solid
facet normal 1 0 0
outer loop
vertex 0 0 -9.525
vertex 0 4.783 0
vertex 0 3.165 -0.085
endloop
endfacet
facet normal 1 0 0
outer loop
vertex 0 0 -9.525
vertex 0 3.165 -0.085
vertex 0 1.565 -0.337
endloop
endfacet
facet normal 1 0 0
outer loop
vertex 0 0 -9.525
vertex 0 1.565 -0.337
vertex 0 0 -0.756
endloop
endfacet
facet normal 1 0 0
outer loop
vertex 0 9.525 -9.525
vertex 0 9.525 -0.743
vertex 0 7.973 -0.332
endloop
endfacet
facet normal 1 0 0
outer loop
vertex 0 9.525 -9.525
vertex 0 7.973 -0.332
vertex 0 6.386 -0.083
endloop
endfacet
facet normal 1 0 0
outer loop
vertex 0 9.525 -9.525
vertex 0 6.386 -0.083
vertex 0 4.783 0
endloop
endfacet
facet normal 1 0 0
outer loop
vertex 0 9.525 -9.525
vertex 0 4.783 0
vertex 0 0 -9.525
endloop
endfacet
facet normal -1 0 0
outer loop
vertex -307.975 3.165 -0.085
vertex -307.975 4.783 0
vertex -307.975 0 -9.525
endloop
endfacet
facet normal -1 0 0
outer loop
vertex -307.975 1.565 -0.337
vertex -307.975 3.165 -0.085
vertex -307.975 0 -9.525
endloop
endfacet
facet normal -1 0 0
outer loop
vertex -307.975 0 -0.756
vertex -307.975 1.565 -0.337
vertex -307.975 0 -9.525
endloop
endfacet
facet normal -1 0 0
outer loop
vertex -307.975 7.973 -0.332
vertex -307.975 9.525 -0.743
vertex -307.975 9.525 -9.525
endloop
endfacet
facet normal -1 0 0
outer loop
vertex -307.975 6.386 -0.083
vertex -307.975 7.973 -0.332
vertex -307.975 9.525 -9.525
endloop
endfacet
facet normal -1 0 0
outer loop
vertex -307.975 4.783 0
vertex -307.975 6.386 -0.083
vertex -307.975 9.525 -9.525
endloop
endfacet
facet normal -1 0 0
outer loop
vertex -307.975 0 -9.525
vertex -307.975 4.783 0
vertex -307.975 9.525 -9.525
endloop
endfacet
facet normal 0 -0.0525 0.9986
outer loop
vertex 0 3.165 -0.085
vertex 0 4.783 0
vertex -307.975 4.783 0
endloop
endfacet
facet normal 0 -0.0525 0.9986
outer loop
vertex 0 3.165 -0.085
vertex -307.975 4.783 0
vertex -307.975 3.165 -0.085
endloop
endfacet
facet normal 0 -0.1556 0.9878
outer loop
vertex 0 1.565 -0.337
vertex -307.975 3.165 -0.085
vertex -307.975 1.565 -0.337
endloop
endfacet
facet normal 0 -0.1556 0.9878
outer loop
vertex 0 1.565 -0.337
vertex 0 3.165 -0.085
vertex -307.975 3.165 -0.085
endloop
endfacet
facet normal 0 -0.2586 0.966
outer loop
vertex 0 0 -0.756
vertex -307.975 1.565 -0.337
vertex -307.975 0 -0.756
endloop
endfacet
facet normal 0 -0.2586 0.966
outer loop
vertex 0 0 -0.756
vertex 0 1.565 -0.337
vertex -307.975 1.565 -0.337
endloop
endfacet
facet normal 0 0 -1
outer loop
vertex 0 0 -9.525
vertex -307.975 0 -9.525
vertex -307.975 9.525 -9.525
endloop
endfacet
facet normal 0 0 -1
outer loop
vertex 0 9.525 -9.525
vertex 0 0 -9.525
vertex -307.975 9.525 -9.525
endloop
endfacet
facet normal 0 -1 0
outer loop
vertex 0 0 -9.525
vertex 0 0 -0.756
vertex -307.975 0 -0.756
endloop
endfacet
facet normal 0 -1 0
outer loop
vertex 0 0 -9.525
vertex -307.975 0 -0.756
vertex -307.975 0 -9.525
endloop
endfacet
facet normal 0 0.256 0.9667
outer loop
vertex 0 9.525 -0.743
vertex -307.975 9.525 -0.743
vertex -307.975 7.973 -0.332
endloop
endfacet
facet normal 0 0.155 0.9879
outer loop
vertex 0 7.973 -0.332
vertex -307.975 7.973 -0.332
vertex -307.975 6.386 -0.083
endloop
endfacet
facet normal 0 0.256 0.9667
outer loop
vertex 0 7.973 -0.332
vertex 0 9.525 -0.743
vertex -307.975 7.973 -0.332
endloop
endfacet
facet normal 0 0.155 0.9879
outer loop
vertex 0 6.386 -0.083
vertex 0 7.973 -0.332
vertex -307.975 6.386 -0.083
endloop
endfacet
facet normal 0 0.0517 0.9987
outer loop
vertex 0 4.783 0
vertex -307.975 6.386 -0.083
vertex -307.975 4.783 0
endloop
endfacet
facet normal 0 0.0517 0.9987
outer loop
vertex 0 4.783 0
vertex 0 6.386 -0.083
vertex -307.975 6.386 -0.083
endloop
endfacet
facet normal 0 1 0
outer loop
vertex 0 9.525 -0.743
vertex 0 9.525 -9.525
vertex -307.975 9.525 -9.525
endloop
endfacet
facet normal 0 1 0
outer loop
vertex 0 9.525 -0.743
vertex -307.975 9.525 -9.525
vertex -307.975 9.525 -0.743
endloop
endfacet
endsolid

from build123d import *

# Parameters (mm, degrees)
BOSS_EXTRUDE1_DEPTH = 307.975


with BuildPart() as part:
    # Sketch1 → Boss-Extrude1 (new body)
    with BuildSketch(Plane(origin=(0, 0, 0), x_dir=(0, 0, -1), z_dir=(1, 0, 0))):
        with BuildLine():
            ThreePointArc((0, 4.782677505), (0.1900696, 2.361677335), (0.755621044, 0))
            Line((0.755621044, 0), (9.525, 0))
            Line((9.525, 0), (9.525, 9.525))
            Line((9.525, 9.525), (0.742604052, 9.525))
            ThreePointArc((0.742604052, 9.525), (0.186775343, 7.182733932), (0, 4.782677505))
        make_face()
    extrude(amount=-BOSS_EXTRUDE1_DEPTH)


solid = part.part
